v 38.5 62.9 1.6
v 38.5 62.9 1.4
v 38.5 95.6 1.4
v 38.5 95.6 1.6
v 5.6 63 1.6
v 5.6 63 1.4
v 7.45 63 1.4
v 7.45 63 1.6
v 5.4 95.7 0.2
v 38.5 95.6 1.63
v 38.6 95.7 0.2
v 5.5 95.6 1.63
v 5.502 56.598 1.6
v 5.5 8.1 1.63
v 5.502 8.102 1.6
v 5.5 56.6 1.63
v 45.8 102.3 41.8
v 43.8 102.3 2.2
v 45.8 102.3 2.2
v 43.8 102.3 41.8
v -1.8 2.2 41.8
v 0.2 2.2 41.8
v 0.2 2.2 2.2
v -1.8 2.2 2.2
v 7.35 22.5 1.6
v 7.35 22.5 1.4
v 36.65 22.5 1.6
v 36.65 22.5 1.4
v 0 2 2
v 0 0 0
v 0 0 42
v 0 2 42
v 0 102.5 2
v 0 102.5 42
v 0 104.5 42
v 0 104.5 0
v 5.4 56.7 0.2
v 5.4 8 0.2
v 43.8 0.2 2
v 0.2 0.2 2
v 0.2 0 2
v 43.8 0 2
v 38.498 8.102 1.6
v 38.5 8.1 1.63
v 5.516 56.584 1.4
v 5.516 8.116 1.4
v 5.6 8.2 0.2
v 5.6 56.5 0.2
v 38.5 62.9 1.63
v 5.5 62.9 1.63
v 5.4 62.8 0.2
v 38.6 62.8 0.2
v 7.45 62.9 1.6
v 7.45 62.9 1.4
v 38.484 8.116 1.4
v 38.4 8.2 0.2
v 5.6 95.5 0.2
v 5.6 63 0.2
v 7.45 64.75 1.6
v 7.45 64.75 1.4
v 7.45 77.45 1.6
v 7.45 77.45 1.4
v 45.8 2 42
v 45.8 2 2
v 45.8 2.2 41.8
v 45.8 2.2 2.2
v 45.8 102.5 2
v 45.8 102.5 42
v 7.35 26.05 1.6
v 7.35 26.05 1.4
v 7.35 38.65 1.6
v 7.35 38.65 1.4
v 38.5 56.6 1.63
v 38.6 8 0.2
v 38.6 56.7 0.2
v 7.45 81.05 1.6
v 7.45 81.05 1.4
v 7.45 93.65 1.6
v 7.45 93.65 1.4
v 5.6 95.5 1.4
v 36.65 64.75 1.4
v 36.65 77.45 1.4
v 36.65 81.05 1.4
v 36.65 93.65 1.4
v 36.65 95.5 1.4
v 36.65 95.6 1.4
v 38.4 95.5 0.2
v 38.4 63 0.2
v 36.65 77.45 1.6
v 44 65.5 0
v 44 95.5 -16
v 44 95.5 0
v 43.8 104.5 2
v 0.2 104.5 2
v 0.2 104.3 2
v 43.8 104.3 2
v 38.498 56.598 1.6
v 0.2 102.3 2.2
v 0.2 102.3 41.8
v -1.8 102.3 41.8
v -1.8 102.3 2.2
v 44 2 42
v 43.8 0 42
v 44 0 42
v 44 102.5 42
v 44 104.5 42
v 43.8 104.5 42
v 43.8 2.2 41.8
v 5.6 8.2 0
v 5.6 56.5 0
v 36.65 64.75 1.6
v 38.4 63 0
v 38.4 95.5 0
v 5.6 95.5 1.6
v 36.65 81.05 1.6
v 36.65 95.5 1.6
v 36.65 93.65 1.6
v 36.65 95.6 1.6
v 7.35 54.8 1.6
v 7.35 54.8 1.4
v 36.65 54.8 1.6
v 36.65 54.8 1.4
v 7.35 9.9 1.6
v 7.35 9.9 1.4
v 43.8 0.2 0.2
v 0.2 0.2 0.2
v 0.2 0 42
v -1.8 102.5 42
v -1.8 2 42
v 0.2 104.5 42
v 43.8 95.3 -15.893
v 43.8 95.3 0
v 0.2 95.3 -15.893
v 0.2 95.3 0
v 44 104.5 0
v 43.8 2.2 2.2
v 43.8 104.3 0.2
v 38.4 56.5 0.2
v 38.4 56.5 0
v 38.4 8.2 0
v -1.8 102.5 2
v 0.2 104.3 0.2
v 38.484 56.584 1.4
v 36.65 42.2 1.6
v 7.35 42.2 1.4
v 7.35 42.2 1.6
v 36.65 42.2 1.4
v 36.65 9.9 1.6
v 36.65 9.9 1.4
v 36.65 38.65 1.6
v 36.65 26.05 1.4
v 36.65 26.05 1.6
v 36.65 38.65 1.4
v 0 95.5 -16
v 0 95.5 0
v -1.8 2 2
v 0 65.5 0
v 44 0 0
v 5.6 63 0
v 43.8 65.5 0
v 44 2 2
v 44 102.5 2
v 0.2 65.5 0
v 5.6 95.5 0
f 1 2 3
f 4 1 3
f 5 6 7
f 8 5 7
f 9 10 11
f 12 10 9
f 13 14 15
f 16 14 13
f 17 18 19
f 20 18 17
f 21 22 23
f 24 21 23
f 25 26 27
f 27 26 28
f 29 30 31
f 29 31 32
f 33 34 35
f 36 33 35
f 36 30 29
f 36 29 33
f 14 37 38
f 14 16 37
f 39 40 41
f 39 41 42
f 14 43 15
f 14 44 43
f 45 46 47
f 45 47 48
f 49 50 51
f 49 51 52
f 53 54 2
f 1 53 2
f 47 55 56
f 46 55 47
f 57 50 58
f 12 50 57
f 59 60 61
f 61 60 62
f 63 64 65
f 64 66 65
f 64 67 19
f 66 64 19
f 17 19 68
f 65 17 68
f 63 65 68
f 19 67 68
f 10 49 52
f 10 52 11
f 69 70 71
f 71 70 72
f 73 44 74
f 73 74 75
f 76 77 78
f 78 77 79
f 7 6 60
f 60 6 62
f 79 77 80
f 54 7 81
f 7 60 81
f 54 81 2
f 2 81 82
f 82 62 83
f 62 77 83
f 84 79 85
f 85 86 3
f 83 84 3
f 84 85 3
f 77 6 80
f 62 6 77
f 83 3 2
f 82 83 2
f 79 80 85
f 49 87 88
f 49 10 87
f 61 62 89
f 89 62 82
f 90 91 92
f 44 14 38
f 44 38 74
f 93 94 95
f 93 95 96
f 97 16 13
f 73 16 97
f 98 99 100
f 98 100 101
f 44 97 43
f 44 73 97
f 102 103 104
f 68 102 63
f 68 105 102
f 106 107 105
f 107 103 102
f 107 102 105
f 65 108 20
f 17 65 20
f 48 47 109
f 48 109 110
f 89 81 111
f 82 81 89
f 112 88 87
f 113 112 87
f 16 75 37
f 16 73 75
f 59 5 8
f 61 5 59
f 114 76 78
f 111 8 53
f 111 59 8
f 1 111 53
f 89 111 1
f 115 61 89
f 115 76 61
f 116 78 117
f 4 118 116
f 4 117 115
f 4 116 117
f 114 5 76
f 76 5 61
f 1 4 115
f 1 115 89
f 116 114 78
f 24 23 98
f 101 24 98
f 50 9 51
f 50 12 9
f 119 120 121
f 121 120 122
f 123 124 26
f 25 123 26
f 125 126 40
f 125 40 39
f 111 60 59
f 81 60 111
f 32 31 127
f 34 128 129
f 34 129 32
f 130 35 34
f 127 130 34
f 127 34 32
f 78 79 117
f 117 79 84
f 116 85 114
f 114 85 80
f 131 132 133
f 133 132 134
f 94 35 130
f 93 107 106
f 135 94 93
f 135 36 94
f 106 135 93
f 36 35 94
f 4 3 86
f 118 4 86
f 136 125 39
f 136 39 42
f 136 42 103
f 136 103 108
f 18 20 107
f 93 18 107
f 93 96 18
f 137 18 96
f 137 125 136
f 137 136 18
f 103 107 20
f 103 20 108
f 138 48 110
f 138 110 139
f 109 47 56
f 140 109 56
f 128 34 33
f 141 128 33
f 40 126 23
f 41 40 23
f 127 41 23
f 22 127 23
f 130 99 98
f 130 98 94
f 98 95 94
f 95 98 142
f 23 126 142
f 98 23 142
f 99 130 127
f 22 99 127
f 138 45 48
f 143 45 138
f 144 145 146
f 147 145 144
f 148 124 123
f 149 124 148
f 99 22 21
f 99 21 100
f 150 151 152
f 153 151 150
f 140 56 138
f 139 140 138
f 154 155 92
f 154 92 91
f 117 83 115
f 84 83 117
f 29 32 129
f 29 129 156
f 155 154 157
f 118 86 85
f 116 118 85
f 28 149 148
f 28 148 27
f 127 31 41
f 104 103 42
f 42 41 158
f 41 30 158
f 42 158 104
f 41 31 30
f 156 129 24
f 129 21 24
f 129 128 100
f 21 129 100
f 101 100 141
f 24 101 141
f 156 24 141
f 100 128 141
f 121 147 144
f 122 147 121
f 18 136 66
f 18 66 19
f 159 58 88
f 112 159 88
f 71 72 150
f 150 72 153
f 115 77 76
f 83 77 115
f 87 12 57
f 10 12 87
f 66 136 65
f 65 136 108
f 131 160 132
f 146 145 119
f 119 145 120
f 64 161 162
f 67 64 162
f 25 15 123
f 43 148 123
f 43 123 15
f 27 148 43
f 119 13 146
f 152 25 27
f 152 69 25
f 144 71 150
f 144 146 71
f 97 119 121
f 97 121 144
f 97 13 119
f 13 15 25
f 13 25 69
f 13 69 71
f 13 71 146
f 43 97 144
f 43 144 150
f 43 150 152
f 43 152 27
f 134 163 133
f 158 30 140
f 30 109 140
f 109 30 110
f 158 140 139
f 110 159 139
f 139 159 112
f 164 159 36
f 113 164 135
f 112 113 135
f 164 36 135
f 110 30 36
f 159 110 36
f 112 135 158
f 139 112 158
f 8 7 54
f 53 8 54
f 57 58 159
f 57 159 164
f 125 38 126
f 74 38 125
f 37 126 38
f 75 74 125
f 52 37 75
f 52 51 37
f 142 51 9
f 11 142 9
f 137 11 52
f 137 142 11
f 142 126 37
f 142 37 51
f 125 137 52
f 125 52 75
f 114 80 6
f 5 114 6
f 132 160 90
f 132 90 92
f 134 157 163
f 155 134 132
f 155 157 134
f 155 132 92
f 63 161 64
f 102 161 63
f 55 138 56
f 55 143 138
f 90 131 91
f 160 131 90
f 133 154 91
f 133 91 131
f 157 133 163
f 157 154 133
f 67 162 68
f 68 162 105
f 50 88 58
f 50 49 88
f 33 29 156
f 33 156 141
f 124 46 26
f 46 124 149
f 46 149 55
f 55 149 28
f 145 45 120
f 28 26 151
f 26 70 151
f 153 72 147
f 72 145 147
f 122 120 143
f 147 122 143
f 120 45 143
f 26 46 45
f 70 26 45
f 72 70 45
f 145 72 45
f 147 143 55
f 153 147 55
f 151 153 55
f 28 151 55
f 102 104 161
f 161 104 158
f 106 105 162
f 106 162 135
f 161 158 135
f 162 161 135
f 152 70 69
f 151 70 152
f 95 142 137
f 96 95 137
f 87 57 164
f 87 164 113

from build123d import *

# Parameters (mm, degrees)
SKETCH_1_W          = 44
SKETCH_1_H          = 104.5
EXTRUDE_1_DEPTH     = 2
SHELL_1_T           = -0.2
SKETCH_2_W          = 32.8
SKETCH_2_H          = 32.5
SKETCH_2_H_2        = 48.3
CUT_EXTRUDE_1_DEPTH = 2
SKETCH_3_W          = 33.2
SKETCH_3_H          = 32.9
SKETCH_3_W_2        = 32.8
SKETCH_3_H_2        = 32.5
SKETCH_3_H_3        = 48.7
SKETCH_3_H_4        = 48.3
EXTRUDE_2_DEPTH     = 1.8
EXTRUDE_2_TAPER     = 4
SKETCH_6_W          = 29.2
SKETCH_6_H          = 12.7
SKETCH_6_H_2        = 12.6
EXTRUDE_3_DEPTH     = 0.2
SKETCH_7_W          = 33
SKETCH_7_H          = 48.5
SKETCH_7_W_2        = 29.3
SKETCH_7_H_2        = 12.6
EXTRUDE_4_DEPTH     = 0.2
EXTRUDE_6_DEPTH     = 44
SKETCH_12_W         = 43.6
SKETCH_12_H         = 29.8
CUT_EXTRUDE_5_DEPTH = 16
SKETCH_13_W         = 40
SKETCH_13_H         = 100.5
SKETCH_13_W_2       = 39.6
SKETCH_13_H_2       = 100.1
EXTRUDE_7_DEPTH     = 2
SKETCH_15_W         = 40
SKETCH_15_H         = 100.5
SKETCH_15_W_2       = 39.6
SKETCH_15_H_2       = 100.1
EXTRUDE_8_DEPTH     = 2
SKETCH_16_W         = 0.2
SKETCH_16_H         = 2
EXTRUDE_9_DEPTH     = 40


with BuildPart() as part:
    # 스케치1 → 보스-돌출1 (new body)
    with BuildSketch(Plane.XY):
        with Locations((22, 52.25)):
            Rectangle(SKETCH_1_W, SKETCH_1_H)
    extrude(amount=EXTRUDE_1_DEPTH)

    # 쉘1
    shell_1_openings = [part.faces().sort_by_distance(p)[0] for p in [
        (22, 52.25, 2),
    ]]
    offset(amount=SHELL_1_T, openings=shell_1_openings, kind=Kind.INTERSECTION)

    # 스케치2 → 컷-돌출1 (cut)
    with BuildSketch(Plane.XY.offset(0.2)):
        with Locations((22, 79.25)):
            Rectangle(SKETCH_2_W, SKETCH_2_H)
        with Locations((22, 32.35)):
            Rectangle(SKETCH_2_W, SKETCH_2_H_2)
    extrude(amount=-CUT_EXTRUDE_1_DEPTH, mode=Mode.SUBTRACT)

    # 스케치3 → 보스-돌출2 (add)
    # profile 1 of 2: a face of its own
    with BuildSketch(Plane.XY.offset(0.2)):
        with Locations((22, 79.25)):
            Rectangle(SKETCH_3_W, SKETCH_3_H)
        with Locations((22, 79.25)):
            Rectangle(SKETCH_3_W_2, SKETCH_3_H_2, mode=Mode.SUBTRACT)
    # profile 2 of 2: a face of its own
    with BuildSketch(Plane.XY.offset(0.2)):
        with Locations((22, 32.35)):
            Rectangle(SKETCH_3_W, SKETCH_3_H_3)
        with Locations((22, 32.35)):
            Rectangle(SKETCH_3_W_2, SKETCH_3_H_4, mode=Mode.SUBTRACT)
    extrude(amount=EXTRUDE_2_DEPTH, taper=EXTRUDE_2_TAPER)

    # 스케치7 → 보스-돌출4 (add)
    with BuildSketch(Plane.XY.offset(1.4)):
        with Locations((22, 32.35)):
            Rectangle(SKETCH_7_W, SKETCH_7_H)
        with Locations((22, 16.2)):
            Rectangle(SKETCH_7_W_2, SKETCH_7_H_2, mode=Mode.SUBTRACT)
        with Locations((22, 32.35)):
            Rectangle(SKETCH_7_W_2, SKETCH_7_H_2, mode=Mode.SUBTRACT)
        with Locations((22, 48.5)):
            Rectangle(SKETCH_7_W_2, SKETCH_7_H_2, mode=Mode.SUBTRACT)
    extrude(amount=EXTRUDE_4_DEPTH)

    # 스케치13 → 보스-돌출7 (add)
    with BuildSketch(Plane.ZY.offset(-43.8)):
        with Locations((22, 52.25)):
            Rectangle(SKETCH_13_W, SKETCH_13_H)
        with Locations((22, 52.25)):
            Rectangle(SKETCH_13_W_2, SKETCH_13_H_2, mode=Mode.SUBTRACT)
    extrude(amount=-EXTRUDE_7_DEPTH)

    # 스케치15 → 보스-돌출8 (add)
    with BuildSketch(Plane(origin=(0.2, 0, 0), x_dir=(0, 0, -1), z_dir=(1, 0, 0))):
        with Locations((-22, 52.25)):
            Rectangle(SKETCH_15_W, SKETCH_15_H)
        with Locations((-22, 52.25)):
            Rectangle(SKETCH_15_W_2, SKETCH_15_H_2, mode=Mode.SUBTRACT)
    extrude(amount=-EXTRUDE_8_DEPTH)

    # 스케치16 → 보스-돌출9 (add)
    with BuildSketch(Plane.XY.offset(2)):
        with Locations((43.9, 103.5)):
            Rectangle(SKETCH_16_W, SKETCH_16_H)
        with Locations((43.9, 1)):
            Rectangle(SKETCH_16_W, SKETCH_16_H)
        with Locations((0.1, 1)):
            Rectangle(SKETCH_16_W, SKETCH_16_H)
        with Locations((0.1, 103.5)):
            Rectangle(SKETCH_16_W, SKETCH_16_H)
    extrude(amount=EXTRUDE_9_DEPTH)


with BuildPart() as body_2:
    # 스케치6 → 보스-돌출3 (new body)
    with BuildSketch(Plane.XY.offset(1.4)):
        Polygon((5.6, 95.5), (5.6, 63), (7.45, 63), (7.45, 62.9), (38.5, 62.9), (38.5, 95.6), (36.65, 95.6), (36.65, 95.5), align=None)
        with Locations((22.05, 71.1)):
            Rectangle(SKETCH_6_W, SKETCH_6_H, mode=Mode.SUBTRACT)
        with Locations((22.05, 87.35)):
            Rectangle(SKETCH_6_W, SKETCH_6_H_2, mode=Mode.SUBTRACT)
    extrude(amount=EXTRUDE_3_DEPTH)


with BuildPart() as body_3:
    # 스케치11 → 보스-돌출6 (new body)
    with BuildSketch(Plane.ZY):
        Polygon((0, 95.5), (-16, 95.5), (0, 65.5), align=None)
    extrude(amount=-EXTRUDE_6_DEPTH)

    # 스케치12 → 컷-돌출5 (cut)
    with BuildSketch(Plane(origin=(0, 0, 0), x_dir=(-1, 0, 0), z_dir=(0, 0, -1))):
        with Locations((-22, 80.4)):
            Rectangle(SKETCH_12_W, SKETCH_12_H)
    extrude(amount=CUT_EXTRUDE_5_DEPTH, mode=Mode.SUBTRACT)


solid = Compound([part.part, body_2.part, body_3.part])
